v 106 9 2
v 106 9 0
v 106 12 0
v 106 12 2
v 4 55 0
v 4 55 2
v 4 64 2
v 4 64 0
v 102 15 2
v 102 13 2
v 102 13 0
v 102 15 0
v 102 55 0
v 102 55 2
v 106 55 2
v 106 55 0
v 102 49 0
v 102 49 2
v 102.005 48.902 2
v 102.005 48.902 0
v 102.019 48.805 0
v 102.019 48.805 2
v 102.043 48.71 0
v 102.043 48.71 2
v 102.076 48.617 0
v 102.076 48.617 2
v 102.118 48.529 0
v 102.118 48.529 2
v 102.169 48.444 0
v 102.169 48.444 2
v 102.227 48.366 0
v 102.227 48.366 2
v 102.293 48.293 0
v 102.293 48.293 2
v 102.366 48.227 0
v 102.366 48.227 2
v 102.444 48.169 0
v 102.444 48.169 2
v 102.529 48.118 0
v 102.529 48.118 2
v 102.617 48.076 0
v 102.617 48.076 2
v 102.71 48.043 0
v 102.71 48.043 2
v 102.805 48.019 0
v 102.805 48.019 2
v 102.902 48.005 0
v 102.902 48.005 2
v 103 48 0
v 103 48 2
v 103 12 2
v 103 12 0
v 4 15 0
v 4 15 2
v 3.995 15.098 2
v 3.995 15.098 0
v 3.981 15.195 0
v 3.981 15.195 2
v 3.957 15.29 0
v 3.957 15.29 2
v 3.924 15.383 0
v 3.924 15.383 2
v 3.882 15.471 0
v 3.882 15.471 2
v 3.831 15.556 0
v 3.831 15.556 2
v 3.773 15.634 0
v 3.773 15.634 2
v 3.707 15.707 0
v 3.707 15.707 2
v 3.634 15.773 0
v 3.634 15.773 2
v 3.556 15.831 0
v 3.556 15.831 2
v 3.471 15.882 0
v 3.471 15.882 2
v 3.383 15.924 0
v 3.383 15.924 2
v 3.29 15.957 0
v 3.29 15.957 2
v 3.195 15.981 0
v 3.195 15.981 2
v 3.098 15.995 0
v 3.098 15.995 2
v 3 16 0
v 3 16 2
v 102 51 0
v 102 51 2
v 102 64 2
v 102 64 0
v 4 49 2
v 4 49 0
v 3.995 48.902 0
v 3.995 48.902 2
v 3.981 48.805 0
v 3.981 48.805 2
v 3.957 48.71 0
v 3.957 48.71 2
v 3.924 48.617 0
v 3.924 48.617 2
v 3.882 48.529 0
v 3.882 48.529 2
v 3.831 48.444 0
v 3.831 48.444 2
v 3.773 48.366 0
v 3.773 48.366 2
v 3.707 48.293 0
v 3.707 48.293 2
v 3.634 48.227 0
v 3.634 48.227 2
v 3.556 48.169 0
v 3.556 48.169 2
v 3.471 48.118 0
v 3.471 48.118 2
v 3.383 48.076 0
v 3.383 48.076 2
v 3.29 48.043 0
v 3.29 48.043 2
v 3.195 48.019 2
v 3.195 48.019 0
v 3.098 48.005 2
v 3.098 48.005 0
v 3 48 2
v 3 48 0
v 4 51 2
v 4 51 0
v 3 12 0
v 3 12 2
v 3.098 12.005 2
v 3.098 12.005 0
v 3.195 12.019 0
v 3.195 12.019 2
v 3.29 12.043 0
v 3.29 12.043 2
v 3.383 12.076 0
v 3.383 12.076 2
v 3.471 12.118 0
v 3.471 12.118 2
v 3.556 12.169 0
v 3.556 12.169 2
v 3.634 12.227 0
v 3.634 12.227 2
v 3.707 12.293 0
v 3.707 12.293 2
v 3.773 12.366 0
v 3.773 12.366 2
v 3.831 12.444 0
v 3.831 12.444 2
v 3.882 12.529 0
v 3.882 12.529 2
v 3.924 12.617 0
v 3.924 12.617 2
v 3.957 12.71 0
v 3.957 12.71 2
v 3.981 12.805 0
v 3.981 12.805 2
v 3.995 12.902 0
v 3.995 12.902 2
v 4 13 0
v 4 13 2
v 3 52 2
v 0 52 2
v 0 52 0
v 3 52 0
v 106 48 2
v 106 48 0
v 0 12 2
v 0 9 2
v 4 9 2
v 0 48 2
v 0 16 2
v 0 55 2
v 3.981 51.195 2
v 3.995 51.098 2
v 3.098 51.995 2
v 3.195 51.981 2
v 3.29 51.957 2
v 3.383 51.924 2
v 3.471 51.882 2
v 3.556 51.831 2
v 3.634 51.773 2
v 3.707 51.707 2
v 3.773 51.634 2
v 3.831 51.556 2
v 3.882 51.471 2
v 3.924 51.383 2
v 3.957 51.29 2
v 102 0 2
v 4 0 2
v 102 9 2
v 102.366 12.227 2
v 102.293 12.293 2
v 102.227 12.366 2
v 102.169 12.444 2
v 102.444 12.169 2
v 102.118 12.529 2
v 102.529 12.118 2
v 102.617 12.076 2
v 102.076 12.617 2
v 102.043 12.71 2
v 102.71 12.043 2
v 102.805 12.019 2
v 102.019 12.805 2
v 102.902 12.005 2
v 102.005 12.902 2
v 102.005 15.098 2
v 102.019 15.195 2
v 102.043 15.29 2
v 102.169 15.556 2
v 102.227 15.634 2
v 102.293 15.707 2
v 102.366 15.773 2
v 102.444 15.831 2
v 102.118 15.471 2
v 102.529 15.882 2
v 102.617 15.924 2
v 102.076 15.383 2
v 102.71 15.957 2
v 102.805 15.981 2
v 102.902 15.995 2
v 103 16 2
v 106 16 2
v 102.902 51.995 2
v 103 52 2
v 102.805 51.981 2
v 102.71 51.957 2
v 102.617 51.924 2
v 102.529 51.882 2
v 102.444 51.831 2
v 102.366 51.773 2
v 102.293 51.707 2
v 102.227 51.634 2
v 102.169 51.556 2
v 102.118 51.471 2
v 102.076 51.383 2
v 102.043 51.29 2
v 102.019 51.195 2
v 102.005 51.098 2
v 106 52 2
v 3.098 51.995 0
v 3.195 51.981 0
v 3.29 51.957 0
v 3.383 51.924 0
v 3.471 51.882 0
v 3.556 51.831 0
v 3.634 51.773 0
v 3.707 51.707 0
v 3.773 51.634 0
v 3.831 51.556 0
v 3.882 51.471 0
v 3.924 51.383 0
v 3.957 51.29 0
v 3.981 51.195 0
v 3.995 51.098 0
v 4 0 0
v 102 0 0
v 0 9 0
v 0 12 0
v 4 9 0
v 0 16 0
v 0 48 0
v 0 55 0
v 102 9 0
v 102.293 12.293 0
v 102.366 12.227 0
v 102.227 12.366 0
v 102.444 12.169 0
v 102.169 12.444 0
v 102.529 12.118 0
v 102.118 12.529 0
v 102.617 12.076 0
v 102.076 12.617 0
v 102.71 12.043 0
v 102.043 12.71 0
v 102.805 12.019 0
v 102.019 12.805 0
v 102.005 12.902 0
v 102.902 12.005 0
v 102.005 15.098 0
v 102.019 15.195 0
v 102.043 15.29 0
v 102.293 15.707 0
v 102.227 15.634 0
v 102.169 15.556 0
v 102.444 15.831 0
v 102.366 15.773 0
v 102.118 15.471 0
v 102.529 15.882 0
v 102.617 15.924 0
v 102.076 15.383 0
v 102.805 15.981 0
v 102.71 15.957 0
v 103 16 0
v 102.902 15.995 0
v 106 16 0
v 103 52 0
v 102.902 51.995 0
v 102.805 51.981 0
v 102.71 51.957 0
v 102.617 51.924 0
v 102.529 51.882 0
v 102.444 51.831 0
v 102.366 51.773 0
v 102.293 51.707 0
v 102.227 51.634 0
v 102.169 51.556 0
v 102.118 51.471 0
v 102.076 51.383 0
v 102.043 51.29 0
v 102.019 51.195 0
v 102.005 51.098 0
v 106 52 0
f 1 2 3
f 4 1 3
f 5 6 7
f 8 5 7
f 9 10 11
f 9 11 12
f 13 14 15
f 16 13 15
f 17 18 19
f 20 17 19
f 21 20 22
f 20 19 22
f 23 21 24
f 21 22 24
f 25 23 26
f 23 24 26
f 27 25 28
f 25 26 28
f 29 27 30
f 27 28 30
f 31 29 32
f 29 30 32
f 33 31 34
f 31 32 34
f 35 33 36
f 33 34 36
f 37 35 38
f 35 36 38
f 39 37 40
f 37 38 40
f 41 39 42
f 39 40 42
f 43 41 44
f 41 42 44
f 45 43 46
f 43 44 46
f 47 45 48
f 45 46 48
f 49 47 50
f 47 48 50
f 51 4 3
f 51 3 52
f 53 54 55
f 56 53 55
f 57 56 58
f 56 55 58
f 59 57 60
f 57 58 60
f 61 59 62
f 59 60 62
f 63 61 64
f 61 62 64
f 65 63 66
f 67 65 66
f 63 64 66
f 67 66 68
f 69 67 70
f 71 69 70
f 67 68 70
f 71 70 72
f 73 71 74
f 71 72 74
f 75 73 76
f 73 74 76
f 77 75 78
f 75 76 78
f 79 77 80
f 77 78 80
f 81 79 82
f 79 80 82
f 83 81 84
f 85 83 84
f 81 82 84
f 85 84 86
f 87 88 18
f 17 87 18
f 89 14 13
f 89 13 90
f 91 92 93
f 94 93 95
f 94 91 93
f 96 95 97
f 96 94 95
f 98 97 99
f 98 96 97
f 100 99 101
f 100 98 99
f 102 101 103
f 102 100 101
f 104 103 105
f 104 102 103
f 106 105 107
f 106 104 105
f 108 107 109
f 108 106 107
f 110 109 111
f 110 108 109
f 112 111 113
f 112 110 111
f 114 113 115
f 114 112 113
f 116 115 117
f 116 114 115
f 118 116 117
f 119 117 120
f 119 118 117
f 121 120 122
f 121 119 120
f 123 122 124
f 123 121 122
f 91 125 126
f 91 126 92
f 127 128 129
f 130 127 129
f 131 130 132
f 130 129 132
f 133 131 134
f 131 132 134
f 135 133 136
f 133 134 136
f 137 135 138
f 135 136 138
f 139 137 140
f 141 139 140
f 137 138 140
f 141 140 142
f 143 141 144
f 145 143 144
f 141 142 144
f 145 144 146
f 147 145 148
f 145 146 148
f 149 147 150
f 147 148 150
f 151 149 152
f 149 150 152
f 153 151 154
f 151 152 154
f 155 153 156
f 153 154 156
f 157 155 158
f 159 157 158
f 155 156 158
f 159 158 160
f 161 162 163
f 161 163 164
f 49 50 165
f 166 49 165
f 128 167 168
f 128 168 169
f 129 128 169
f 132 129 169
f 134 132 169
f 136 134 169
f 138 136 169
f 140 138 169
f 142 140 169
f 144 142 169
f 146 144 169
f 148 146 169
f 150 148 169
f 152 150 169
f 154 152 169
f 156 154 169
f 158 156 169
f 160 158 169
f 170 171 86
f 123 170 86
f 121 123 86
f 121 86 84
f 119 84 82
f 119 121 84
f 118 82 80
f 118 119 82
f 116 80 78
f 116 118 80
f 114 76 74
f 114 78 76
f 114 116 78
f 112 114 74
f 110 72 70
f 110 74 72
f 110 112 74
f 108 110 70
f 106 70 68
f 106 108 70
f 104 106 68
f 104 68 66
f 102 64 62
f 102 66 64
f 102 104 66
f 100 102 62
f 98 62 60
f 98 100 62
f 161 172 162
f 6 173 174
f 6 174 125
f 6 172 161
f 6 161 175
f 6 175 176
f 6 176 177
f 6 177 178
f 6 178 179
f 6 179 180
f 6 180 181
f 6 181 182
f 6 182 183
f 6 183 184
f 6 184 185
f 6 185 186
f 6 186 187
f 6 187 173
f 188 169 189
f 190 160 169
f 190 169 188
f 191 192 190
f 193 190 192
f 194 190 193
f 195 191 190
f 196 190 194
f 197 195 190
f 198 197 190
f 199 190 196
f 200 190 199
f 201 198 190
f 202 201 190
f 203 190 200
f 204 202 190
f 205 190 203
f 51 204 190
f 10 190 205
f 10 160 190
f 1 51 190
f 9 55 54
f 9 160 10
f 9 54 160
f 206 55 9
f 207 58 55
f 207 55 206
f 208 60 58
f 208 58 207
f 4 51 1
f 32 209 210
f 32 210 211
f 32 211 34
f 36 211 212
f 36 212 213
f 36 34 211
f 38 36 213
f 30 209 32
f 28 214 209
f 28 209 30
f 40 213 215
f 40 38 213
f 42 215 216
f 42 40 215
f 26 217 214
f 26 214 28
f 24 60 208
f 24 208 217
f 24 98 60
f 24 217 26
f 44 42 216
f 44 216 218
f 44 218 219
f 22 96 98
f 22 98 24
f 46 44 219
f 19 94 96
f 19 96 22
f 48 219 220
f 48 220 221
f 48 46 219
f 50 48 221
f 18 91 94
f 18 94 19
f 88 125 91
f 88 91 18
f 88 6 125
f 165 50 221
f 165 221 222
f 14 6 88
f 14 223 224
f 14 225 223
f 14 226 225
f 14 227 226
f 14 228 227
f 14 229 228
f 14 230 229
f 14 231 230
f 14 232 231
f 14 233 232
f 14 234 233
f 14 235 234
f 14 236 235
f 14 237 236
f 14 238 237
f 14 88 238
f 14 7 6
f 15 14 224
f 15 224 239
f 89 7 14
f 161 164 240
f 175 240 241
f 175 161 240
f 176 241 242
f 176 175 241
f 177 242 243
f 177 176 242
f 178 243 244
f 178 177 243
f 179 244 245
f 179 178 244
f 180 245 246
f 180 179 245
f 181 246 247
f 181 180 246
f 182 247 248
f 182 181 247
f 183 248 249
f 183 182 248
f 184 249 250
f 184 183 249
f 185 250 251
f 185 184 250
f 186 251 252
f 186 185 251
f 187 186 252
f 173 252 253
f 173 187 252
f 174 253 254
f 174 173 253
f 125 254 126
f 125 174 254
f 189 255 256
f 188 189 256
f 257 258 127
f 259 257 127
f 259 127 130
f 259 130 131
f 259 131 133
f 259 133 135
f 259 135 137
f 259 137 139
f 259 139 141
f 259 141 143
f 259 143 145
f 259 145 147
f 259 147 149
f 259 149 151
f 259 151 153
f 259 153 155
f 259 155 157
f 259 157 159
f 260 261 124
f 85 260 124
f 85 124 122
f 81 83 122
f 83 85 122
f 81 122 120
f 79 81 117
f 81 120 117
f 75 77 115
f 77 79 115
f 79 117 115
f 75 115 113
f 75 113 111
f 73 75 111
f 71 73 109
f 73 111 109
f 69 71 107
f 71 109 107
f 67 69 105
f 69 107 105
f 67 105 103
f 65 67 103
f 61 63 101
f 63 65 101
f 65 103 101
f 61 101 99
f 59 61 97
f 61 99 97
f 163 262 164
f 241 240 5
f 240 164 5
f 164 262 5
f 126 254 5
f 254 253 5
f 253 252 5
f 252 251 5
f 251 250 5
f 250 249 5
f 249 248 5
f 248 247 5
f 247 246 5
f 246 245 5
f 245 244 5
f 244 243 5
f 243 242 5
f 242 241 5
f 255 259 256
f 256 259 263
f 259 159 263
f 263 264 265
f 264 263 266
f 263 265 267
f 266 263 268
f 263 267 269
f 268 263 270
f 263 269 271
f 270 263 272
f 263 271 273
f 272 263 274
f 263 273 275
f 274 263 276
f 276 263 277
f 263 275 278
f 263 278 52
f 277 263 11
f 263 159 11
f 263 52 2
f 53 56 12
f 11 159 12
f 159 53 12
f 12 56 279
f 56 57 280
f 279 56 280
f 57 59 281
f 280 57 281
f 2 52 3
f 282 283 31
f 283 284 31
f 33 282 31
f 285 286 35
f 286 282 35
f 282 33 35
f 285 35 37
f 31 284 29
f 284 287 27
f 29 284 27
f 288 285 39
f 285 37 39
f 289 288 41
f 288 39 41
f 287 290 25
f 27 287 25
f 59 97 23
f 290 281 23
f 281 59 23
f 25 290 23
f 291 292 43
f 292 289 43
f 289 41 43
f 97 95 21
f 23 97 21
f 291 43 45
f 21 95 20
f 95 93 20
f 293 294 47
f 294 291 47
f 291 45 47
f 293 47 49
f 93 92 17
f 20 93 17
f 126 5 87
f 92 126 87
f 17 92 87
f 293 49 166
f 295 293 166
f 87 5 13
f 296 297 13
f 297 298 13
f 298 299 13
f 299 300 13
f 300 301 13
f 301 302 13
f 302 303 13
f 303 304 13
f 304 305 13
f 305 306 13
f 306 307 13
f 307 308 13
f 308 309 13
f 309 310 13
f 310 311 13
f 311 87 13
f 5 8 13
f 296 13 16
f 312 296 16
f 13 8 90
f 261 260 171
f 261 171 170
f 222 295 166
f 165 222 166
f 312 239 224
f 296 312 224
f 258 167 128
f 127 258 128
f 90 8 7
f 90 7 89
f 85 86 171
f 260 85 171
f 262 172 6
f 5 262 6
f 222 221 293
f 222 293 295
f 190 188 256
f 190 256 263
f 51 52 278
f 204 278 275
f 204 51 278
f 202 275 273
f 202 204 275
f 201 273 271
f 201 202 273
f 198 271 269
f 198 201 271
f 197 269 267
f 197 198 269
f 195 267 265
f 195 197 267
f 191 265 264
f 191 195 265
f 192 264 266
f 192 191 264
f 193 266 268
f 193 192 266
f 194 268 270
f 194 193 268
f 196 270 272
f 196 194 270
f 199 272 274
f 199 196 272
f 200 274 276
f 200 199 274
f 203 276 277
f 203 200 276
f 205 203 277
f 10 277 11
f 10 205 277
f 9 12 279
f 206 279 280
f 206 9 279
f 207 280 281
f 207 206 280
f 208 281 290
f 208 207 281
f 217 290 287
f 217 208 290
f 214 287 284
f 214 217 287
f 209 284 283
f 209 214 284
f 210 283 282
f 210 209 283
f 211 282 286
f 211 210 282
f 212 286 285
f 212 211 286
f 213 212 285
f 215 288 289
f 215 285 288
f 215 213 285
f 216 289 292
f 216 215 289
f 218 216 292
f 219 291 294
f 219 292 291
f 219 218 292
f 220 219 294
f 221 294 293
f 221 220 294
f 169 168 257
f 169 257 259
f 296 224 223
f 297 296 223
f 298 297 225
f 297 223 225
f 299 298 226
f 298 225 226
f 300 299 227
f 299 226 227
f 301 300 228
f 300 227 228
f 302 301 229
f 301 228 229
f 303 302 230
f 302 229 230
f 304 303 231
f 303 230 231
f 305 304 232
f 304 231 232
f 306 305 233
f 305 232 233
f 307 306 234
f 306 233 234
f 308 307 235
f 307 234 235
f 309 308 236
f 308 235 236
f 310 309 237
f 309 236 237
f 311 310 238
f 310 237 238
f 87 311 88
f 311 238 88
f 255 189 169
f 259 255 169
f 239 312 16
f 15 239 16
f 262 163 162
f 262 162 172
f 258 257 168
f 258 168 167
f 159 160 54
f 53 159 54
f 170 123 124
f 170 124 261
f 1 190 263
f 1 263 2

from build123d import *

# Parameters (mm, degrees)
SKETCH1_W           = 106
SKETCH1_H           = 64
BOSS_EXTRUDE1_DEPTH = 2
SKETCH2_W           = 4
SKETCH2_H           = 9
CUT_EXTRUDE1_DEPTH  = 124.838604643
CUT_EXTRUDE2_DEPTH  = 124.838604643


with BuildPart() as part:
    # Sketch1 → Boss-Extrude1 (new body)
    with BuildSketch(Plane.XY):
        with Locations((53, 32)):
            Rectangle(SKETCH1_W, SKETCH1_H)
    extrude(amount=BOSS_EXTRUDE1_DEPTH)

    # Sketch2 → Cut-Extrude1 (cut, through all)
    with BuildSketch(Plane.XY.offset(2)):
        with Locations((2, 59.5)):
            Rectangle(SKETCH2_W, SKETCH2_H)
        with Locations((2, 4.5)):
            Rectangle(SKETCH2_W, SKETCH2_H)
        with Locations((104, 4.5)):
            Rectangle(SKETCH2_W, SKETCH2_H)
        with Locations((104, 59.5)):
            Rectangle(SKETCH2_W, SKETCH2_H)
    extrude(amount=-CUT_EXTRUDE1_DEPTH, mode=Mode.SUBTRACT)

    # Sketch3 → Cut-Extrude2 (cut, through all)
    with BuildSketch(Plane.XY.offset(2)):
        with BuildLine():
            Line((106, 12), (103, 12))
            ThreePointArc((103, 12), (102.292893219, 12.292893219), (102, 13))
            Line((102, 13), (102, 15))
            ThreePointArc((102, 15), (102.292893219, 15.707106781), (103, 16))
            Line((103, 16), (106, 16))
            Line((106, 16), (106, 12))
        make_face()
        with BuildLine():
            Line((0, 12), (3, 12))
            ThreePointArc((3, 12), (3.707106781, 12.292893219), (4, 13))
            Line((4, 13), (4, 15))
            ThreePointArc((4, 15), (3.707106781, 15.707106781), (3, 16))
            Line((3, 16), (0, 16))
            Line((0, 16), (0, 12))
        make_face()
        with BuildLine():
            Line((0, 52), (3, 52))
            ThreePointArc((3, 52), (3.707106781, 51.707106781), (4, 51))
            Line((4, 51), (4, 49))
            ThreePointArc((4, 49), (3.707106781, 48.292893219), (3, 48))
            Line((3, 48), (0, 48))
            Line((0, 48), (0, 52))
        make_face()
        with BuildLine():
            Line((106, 52), (103, 52))
            ThreePointArc((103, 52), (102.292893219, 51.707106781), (102, 51))
            Line((102, 51), (102, 49))
            ThreePointArc((102, 49), (102.292893219, 48.292893219), (103, 48))
            Line((103, 48), (106, 48))
            Line((106, 48), (106, 52))
        make_face()
    extrude(amount=-CUT_EXTRUDE2_DEPTH, mode=Mode.SUBTRACT)


solid = part.part
